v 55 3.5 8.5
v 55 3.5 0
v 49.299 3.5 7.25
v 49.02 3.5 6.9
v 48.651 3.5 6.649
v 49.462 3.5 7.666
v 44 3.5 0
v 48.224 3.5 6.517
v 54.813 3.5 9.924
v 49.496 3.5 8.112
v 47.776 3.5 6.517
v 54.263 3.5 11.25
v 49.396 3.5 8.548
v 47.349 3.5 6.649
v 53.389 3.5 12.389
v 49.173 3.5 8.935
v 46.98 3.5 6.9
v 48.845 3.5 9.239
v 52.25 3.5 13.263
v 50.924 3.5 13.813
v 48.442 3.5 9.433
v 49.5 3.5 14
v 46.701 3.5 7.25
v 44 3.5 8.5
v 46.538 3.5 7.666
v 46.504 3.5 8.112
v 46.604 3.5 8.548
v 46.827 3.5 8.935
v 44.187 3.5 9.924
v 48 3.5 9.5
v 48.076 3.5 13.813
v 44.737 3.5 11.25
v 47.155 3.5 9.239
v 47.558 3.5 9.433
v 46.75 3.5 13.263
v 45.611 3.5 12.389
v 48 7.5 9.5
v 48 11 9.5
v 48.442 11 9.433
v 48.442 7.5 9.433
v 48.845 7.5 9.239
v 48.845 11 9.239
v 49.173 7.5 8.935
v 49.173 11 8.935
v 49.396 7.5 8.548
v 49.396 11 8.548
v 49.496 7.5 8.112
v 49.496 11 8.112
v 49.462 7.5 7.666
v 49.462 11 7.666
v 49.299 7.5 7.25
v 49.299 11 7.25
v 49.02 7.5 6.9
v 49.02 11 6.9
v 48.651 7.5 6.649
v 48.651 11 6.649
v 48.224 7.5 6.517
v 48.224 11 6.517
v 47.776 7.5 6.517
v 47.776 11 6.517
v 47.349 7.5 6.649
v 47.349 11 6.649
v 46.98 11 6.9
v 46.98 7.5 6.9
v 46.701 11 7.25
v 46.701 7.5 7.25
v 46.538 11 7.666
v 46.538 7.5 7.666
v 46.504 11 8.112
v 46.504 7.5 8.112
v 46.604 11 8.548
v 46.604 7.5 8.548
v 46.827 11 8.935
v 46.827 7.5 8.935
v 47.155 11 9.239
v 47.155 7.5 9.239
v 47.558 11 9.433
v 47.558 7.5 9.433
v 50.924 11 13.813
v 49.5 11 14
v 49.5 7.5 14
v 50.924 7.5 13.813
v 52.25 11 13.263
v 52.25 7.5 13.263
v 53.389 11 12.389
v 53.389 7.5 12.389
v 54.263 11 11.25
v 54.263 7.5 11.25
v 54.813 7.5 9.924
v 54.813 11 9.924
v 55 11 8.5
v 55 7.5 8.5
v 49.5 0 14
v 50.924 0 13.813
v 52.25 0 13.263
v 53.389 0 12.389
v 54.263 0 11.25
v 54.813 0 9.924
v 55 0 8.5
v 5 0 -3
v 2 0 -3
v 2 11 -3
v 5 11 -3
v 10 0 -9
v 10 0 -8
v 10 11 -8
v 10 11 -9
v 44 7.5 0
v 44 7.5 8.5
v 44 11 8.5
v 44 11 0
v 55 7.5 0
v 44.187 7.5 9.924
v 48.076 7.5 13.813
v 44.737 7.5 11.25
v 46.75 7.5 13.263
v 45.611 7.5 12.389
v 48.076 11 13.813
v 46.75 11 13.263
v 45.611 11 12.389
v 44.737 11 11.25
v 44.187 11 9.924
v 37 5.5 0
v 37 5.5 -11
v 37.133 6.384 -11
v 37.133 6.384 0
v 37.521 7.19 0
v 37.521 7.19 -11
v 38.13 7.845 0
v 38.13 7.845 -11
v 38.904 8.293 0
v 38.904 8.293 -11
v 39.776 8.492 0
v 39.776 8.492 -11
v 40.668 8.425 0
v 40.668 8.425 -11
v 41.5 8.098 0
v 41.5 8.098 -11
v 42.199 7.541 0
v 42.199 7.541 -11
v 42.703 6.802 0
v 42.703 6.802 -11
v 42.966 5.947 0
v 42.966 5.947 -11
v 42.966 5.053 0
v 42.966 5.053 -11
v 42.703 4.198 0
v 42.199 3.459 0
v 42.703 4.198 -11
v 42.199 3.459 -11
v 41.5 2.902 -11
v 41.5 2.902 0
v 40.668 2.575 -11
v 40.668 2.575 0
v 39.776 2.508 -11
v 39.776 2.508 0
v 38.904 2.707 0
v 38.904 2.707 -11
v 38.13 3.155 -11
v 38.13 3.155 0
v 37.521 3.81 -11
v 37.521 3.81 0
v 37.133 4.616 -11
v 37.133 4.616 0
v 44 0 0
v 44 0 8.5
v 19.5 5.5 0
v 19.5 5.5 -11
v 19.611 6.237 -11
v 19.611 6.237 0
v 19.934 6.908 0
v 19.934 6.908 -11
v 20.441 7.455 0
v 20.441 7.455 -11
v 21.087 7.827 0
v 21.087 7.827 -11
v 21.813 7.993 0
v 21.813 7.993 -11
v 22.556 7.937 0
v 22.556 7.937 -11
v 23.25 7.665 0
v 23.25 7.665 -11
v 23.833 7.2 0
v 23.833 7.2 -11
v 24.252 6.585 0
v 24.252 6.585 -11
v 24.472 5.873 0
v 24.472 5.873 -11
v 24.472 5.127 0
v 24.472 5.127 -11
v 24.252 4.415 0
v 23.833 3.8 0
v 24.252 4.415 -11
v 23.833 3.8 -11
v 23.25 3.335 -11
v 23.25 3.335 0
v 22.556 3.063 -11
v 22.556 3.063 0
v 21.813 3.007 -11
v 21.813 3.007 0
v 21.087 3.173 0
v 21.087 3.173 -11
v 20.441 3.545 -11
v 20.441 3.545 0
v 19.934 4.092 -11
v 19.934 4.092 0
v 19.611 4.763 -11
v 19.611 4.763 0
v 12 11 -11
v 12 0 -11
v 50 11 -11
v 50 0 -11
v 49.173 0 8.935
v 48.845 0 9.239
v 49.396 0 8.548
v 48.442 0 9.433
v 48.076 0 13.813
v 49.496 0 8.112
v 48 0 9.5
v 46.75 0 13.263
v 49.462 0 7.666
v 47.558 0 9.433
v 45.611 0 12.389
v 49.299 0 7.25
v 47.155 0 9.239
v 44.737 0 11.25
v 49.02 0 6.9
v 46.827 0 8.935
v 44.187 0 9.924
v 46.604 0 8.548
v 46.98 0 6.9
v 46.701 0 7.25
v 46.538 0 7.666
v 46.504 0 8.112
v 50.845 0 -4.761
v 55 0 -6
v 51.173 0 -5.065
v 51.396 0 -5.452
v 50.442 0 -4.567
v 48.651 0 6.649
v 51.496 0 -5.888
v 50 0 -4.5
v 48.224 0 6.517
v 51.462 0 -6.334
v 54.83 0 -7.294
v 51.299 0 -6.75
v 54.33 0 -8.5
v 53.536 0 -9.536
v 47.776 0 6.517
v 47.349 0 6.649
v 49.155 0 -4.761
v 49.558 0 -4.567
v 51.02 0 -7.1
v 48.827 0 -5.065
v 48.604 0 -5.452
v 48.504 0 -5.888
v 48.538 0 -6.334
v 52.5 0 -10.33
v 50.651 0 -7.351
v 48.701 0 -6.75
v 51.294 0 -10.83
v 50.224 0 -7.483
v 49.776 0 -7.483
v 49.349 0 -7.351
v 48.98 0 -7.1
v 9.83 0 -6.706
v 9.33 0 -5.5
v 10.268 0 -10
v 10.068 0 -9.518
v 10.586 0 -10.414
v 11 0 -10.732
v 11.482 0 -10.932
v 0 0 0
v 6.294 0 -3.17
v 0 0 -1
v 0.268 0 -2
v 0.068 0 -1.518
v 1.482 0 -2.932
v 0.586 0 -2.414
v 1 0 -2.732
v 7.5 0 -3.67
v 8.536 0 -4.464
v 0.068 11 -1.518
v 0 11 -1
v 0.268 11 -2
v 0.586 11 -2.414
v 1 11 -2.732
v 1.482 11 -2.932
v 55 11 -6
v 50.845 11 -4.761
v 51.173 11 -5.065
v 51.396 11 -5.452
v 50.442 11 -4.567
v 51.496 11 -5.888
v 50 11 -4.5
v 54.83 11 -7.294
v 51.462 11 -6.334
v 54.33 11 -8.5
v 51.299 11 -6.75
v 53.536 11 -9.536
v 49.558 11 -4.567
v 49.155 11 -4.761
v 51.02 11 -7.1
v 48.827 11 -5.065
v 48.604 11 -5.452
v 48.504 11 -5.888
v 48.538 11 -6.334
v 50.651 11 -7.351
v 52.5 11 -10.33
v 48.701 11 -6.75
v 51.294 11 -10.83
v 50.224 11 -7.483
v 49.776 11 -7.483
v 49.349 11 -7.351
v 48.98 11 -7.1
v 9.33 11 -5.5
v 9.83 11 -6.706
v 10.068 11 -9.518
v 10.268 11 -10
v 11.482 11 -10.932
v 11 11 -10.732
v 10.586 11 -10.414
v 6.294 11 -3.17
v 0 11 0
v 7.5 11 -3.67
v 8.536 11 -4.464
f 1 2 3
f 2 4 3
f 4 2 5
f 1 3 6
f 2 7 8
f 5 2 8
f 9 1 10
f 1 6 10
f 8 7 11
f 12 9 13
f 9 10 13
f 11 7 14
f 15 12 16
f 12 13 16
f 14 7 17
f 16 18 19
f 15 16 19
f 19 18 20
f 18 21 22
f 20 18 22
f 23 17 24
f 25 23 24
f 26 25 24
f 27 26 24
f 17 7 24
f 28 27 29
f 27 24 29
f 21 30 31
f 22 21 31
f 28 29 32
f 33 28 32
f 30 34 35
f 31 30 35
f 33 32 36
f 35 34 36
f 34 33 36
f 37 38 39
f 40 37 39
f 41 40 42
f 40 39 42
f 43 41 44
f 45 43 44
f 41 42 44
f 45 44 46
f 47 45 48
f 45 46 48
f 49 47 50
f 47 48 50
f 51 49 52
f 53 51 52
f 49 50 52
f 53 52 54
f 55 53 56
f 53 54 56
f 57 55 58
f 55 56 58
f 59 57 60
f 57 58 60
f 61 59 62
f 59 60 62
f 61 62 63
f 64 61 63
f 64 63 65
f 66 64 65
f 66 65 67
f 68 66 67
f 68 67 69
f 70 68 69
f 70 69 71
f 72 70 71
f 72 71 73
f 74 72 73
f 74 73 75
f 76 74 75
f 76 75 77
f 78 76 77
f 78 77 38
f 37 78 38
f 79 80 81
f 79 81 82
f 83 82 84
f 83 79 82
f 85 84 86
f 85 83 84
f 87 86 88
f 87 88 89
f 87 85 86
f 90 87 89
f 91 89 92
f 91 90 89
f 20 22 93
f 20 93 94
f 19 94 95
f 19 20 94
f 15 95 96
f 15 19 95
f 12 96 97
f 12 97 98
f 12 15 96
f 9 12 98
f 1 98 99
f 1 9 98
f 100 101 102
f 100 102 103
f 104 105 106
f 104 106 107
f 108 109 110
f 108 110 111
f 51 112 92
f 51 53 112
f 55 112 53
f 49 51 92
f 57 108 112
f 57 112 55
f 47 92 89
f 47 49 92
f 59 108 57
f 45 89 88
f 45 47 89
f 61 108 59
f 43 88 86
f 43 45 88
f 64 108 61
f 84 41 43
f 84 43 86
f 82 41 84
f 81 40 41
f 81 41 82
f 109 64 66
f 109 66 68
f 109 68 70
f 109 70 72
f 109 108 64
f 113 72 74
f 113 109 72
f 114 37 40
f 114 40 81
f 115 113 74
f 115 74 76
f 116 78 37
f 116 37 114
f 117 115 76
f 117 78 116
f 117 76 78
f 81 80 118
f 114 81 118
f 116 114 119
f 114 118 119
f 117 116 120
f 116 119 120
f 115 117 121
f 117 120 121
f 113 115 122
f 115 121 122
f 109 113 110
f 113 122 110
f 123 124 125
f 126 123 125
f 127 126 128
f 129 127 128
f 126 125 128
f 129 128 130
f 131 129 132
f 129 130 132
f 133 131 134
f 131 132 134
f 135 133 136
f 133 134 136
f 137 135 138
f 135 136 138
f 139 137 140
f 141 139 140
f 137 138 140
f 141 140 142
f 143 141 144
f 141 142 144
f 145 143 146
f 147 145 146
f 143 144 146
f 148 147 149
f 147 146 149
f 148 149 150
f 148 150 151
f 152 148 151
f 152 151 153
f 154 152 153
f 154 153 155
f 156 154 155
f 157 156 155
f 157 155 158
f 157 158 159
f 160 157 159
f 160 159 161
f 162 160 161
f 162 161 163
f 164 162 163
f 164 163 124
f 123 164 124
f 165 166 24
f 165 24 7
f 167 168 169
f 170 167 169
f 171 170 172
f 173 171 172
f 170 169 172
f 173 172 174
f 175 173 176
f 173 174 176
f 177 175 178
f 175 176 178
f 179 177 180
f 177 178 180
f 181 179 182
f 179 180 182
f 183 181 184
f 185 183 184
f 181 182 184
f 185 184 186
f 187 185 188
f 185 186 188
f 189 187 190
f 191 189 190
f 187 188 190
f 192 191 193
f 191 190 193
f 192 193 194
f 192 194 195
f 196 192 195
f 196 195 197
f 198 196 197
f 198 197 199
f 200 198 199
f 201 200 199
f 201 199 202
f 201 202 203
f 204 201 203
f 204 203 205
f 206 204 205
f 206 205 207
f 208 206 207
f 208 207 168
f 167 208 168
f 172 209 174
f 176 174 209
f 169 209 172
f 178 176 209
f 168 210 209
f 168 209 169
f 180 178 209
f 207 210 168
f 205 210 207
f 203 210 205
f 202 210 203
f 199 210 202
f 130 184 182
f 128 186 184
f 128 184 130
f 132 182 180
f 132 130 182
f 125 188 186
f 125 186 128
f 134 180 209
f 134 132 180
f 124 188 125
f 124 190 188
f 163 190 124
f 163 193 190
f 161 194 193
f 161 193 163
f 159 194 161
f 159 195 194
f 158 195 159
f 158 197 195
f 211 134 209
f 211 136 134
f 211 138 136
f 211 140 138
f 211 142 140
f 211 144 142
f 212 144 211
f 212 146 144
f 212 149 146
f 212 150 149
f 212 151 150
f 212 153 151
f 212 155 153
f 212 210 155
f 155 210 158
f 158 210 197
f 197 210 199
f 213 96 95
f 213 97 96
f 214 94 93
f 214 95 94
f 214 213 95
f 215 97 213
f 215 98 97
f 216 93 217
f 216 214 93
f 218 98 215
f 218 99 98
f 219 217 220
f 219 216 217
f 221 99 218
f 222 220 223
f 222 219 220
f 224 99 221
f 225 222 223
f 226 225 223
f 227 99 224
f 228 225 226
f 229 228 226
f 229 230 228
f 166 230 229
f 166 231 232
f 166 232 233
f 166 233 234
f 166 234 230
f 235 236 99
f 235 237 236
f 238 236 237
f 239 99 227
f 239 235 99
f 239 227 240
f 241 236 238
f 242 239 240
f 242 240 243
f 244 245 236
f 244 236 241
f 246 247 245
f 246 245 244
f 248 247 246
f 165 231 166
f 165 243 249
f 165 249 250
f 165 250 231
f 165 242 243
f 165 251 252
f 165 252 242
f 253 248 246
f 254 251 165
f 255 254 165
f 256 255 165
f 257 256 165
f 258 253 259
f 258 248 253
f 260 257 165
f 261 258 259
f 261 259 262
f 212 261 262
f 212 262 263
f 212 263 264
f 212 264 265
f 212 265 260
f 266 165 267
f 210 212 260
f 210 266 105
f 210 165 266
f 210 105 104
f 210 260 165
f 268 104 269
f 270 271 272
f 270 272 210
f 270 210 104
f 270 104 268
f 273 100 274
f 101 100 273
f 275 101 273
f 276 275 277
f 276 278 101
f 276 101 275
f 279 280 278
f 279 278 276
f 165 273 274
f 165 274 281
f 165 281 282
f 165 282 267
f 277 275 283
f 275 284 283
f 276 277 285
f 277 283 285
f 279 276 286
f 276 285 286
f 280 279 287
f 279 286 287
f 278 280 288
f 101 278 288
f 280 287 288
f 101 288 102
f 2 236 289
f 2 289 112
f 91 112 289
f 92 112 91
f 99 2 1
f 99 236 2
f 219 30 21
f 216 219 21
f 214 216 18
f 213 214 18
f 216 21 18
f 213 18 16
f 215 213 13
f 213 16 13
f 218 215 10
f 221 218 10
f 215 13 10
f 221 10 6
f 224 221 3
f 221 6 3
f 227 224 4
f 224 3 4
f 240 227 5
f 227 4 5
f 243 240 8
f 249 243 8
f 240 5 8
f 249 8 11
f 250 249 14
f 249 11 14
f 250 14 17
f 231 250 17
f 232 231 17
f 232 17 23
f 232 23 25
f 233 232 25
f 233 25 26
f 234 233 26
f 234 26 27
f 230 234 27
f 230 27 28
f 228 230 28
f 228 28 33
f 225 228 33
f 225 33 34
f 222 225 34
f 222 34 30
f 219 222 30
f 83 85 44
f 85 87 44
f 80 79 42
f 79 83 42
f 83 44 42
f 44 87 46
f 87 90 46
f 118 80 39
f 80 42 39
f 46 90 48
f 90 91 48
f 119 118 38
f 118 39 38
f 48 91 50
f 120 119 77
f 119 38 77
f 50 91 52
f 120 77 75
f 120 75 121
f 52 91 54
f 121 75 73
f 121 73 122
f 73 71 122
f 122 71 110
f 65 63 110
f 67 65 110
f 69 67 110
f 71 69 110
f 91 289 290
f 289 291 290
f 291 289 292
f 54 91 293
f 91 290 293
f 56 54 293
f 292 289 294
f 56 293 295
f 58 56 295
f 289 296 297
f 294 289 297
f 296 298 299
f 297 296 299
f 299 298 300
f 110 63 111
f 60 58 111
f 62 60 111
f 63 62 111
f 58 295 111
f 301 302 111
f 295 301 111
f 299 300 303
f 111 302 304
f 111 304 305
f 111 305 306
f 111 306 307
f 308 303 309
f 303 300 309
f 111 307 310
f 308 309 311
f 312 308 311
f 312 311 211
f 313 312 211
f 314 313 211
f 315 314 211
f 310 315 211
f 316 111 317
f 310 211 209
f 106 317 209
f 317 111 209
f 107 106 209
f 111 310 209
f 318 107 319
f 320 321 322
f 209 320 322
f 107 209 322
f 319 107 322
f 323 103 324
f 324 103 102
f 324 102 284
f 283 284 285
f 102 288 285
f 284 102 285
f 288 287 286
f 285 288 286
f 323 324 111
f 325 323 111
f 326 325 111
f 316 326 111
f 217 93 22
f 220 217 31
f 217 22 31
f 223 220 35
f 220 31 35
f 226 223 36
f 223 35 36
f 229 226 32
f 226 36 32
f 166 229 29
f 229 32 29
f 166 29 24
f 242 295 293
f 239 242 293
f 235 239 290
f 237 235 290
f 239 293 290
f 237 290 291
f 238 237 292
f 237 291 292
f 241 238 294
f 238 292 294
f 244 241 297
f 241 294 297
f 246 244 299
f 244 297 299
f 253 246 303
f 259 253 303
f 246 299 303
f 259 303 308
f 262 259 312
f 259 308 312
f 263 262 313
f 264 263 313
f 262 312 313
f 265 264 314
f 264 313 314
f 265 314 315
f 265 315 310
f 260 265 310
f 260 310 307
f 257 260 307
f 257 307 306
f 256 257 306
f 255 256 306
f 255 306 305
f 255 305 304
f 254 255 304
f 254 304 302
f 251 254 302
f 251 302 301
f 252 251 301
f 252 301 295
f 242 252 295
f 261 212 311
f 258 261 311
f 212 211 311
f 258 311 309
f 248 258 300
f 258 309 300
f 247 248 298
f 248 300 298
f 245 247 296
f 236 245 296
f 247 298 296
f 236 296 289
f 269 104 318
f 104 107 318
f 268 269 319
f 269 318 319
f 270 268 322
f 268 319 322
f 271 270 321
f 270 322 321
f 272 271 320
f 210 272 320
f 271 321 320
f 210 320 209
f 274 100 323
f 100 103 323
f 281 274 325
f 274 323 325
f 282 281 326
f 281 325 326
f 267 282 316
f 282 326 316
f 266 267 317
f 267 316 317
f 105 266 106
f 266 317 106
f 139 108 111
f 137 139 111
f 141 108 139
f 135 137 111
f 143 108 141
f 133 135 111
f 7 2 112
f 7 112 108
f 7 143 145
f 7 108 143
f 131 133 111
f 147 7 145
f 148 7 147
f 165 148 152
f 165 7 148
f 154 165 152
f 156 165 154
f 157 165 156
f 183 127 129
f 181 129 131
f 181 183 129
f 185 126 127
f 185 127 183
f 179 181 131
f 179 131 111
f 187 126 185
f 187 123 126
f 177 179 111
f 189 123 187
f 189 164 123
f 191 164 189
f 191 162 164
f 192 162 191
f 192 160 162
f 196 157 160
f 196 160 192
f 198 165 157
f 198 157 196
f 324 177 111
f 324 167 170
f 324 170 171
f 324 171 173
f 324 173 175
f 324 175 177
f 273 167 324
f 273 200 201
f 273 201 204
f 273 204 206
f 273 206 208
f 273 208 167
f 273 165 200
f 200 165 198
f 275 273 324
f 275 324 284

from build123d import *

# Parameters (mm, degrees)
BOSS_EXTRUDE1_DEPTH = 11
FILLET1_R           = 2
FILLET2_R           = 5
FILLET3_R           = 2
FILLET4_R           = 5
FILLET5_R           = 5.5
FILLET6_R           = 5.5
SKETCH2_W           = 22.197918088
SKETCH2_H           = 4
CUT_EXTRUDE1_DEPTH  = 11
SKETCH3_R           = 1.5
CUT_EXTRUDE2_DEPTH  = 11
SKETCH4_R           = 3
CUT_EXTRUDE3_DEPTH  = 31
SKETCH5_R           = 2.5
CUT_EXTRUDE4_DEPTH  = 31
SKETCH6_R           = 1.5
CUT_EXTRUDE5_DEPTH  = 31


with BuildPart() as part:
    # Sketch1 → Boss-Extrude1 (new body)
    with BuildSketch(Plane(origin=(0, 0, 0), x_dir=(1, 0, 0), z_dir=(0, 1, 0))):
        Polygon((0, 0), (0, 3), (10, 3), (10, 11), (55, 11), (55, -14), (44, -14), (44, 0), align=None)
    extrude(amount=BOSS_EXTRUDE1_DEPTH)

    # Fillet1
    fillet1_edges = [part.edges().sort_by_distance(p)[0] for p in [
        (0, 5.5, -3),
    ]]
    fillet(fillet1_edges, radius=FILLET1_R)

    # Fillet2
    fillet2_edges = [part.edges().sort_by_distance(p)[0] for p in [
        (10, 5.5, -3),
    ]]
    fillet(fillet2_edges, radius=FILLET2_R)

    # Fillet3
    fillet3_edges = [part.edges().sort_by_distance(p)[0] for p in [
        (10, 5.5, -11),
    ]]
    fillet(fillet3_edges, radius=FILLET3_R)

    # Fillet4
    fillet4_edges = [part.edges().sort_by_distance(p)[0] for p in [
        (55, 5.5, -11),
    ]]
    fillet(fillet4_edges, radius=FILLET4_R)

    # Fillet5
    fillet5_edges = [part.edges().sort_by_distance(p)[0] for p in [
        (44, 5.5, 14),
    ]]
    fillet(fillet5_edges, radius=FILLET5_R)

    # Fillet6
    fillet6_edges = [part.edges().sort_by_distance(p)[0] for p in [
        (55, 5.5, 14),
    ]]
    fillet(fillet6_edges, radius=FILLET6_R - 0.0001)  # a hair under: the kernel refuses the full size

    # Sketch2 → Cut-Extrude1 (cut)
    with BuildSketch(Plane.ZY.offset(-44)):
        with Locations((11.098959044, 5.5)):
            Rectangle(SKETCH2_W, SKETCH2_H)
    extrude(amount=-CUT_EXTRUDE1_DEPTH, mode=Mode.SUBTRACT)

    # Sketch3 → Cut-Extrude2 (cut)
    with BuildSketch(Plane(origin=(0, 11, 0), x_dir=(1, 0, 0), z_dir=(0, 1, 0))):
        with Locations(Location((48, -8, 0), (0, 0, 270))):
            Circle(SKETCH3_R)
    extrude(amount=-CUT_EXTRUDE2_DEPTH, mode=Mode.SUBTRACT)

    # Sketch4 → Cut-Extrude3 (cut)
    with BuildSketch(Plane(origin=(0, 0, -11), x_dir=(-1, 0, 0), z_dir=(0, 0, -1))):
        with Locations((-40, 5.5)):
            Circle(SKETCH4_R)
    extrude(amount=-CUT_EXTRUDE3_DEPTH, mode=Mode.SUBTRACT)

    # Sketch5 → Cut-Extrude4 (cut)
    with BuildSketch(Plane(origin=(0, 0, -11), x_dir=(-1, 0, 0), z_dir=(0, 0, -1))):
        with Locations((-22, 5.5)):
            Circle(SKETCH5_R)
    extrude(amount=-CUT_EXTRUDE4_DEPTH, mode=Mode.SUBTRACT)

    # Sketch6 → Cut-Extrude5 (cut)
    with BuildSketch(Plane(origin=(0, 11, 0), x_dir=(1, 0, 0), z_dir=(0, 1, 0))):
        with Locations(Location((50, 6, 0), (0, 0, 270))):
            Circle(SKETCH6_R)
    extrude(amount=-CUT_EXTRUDE5_DEPTH, mode=Mode.SUBTRACT)


solid = part.part
